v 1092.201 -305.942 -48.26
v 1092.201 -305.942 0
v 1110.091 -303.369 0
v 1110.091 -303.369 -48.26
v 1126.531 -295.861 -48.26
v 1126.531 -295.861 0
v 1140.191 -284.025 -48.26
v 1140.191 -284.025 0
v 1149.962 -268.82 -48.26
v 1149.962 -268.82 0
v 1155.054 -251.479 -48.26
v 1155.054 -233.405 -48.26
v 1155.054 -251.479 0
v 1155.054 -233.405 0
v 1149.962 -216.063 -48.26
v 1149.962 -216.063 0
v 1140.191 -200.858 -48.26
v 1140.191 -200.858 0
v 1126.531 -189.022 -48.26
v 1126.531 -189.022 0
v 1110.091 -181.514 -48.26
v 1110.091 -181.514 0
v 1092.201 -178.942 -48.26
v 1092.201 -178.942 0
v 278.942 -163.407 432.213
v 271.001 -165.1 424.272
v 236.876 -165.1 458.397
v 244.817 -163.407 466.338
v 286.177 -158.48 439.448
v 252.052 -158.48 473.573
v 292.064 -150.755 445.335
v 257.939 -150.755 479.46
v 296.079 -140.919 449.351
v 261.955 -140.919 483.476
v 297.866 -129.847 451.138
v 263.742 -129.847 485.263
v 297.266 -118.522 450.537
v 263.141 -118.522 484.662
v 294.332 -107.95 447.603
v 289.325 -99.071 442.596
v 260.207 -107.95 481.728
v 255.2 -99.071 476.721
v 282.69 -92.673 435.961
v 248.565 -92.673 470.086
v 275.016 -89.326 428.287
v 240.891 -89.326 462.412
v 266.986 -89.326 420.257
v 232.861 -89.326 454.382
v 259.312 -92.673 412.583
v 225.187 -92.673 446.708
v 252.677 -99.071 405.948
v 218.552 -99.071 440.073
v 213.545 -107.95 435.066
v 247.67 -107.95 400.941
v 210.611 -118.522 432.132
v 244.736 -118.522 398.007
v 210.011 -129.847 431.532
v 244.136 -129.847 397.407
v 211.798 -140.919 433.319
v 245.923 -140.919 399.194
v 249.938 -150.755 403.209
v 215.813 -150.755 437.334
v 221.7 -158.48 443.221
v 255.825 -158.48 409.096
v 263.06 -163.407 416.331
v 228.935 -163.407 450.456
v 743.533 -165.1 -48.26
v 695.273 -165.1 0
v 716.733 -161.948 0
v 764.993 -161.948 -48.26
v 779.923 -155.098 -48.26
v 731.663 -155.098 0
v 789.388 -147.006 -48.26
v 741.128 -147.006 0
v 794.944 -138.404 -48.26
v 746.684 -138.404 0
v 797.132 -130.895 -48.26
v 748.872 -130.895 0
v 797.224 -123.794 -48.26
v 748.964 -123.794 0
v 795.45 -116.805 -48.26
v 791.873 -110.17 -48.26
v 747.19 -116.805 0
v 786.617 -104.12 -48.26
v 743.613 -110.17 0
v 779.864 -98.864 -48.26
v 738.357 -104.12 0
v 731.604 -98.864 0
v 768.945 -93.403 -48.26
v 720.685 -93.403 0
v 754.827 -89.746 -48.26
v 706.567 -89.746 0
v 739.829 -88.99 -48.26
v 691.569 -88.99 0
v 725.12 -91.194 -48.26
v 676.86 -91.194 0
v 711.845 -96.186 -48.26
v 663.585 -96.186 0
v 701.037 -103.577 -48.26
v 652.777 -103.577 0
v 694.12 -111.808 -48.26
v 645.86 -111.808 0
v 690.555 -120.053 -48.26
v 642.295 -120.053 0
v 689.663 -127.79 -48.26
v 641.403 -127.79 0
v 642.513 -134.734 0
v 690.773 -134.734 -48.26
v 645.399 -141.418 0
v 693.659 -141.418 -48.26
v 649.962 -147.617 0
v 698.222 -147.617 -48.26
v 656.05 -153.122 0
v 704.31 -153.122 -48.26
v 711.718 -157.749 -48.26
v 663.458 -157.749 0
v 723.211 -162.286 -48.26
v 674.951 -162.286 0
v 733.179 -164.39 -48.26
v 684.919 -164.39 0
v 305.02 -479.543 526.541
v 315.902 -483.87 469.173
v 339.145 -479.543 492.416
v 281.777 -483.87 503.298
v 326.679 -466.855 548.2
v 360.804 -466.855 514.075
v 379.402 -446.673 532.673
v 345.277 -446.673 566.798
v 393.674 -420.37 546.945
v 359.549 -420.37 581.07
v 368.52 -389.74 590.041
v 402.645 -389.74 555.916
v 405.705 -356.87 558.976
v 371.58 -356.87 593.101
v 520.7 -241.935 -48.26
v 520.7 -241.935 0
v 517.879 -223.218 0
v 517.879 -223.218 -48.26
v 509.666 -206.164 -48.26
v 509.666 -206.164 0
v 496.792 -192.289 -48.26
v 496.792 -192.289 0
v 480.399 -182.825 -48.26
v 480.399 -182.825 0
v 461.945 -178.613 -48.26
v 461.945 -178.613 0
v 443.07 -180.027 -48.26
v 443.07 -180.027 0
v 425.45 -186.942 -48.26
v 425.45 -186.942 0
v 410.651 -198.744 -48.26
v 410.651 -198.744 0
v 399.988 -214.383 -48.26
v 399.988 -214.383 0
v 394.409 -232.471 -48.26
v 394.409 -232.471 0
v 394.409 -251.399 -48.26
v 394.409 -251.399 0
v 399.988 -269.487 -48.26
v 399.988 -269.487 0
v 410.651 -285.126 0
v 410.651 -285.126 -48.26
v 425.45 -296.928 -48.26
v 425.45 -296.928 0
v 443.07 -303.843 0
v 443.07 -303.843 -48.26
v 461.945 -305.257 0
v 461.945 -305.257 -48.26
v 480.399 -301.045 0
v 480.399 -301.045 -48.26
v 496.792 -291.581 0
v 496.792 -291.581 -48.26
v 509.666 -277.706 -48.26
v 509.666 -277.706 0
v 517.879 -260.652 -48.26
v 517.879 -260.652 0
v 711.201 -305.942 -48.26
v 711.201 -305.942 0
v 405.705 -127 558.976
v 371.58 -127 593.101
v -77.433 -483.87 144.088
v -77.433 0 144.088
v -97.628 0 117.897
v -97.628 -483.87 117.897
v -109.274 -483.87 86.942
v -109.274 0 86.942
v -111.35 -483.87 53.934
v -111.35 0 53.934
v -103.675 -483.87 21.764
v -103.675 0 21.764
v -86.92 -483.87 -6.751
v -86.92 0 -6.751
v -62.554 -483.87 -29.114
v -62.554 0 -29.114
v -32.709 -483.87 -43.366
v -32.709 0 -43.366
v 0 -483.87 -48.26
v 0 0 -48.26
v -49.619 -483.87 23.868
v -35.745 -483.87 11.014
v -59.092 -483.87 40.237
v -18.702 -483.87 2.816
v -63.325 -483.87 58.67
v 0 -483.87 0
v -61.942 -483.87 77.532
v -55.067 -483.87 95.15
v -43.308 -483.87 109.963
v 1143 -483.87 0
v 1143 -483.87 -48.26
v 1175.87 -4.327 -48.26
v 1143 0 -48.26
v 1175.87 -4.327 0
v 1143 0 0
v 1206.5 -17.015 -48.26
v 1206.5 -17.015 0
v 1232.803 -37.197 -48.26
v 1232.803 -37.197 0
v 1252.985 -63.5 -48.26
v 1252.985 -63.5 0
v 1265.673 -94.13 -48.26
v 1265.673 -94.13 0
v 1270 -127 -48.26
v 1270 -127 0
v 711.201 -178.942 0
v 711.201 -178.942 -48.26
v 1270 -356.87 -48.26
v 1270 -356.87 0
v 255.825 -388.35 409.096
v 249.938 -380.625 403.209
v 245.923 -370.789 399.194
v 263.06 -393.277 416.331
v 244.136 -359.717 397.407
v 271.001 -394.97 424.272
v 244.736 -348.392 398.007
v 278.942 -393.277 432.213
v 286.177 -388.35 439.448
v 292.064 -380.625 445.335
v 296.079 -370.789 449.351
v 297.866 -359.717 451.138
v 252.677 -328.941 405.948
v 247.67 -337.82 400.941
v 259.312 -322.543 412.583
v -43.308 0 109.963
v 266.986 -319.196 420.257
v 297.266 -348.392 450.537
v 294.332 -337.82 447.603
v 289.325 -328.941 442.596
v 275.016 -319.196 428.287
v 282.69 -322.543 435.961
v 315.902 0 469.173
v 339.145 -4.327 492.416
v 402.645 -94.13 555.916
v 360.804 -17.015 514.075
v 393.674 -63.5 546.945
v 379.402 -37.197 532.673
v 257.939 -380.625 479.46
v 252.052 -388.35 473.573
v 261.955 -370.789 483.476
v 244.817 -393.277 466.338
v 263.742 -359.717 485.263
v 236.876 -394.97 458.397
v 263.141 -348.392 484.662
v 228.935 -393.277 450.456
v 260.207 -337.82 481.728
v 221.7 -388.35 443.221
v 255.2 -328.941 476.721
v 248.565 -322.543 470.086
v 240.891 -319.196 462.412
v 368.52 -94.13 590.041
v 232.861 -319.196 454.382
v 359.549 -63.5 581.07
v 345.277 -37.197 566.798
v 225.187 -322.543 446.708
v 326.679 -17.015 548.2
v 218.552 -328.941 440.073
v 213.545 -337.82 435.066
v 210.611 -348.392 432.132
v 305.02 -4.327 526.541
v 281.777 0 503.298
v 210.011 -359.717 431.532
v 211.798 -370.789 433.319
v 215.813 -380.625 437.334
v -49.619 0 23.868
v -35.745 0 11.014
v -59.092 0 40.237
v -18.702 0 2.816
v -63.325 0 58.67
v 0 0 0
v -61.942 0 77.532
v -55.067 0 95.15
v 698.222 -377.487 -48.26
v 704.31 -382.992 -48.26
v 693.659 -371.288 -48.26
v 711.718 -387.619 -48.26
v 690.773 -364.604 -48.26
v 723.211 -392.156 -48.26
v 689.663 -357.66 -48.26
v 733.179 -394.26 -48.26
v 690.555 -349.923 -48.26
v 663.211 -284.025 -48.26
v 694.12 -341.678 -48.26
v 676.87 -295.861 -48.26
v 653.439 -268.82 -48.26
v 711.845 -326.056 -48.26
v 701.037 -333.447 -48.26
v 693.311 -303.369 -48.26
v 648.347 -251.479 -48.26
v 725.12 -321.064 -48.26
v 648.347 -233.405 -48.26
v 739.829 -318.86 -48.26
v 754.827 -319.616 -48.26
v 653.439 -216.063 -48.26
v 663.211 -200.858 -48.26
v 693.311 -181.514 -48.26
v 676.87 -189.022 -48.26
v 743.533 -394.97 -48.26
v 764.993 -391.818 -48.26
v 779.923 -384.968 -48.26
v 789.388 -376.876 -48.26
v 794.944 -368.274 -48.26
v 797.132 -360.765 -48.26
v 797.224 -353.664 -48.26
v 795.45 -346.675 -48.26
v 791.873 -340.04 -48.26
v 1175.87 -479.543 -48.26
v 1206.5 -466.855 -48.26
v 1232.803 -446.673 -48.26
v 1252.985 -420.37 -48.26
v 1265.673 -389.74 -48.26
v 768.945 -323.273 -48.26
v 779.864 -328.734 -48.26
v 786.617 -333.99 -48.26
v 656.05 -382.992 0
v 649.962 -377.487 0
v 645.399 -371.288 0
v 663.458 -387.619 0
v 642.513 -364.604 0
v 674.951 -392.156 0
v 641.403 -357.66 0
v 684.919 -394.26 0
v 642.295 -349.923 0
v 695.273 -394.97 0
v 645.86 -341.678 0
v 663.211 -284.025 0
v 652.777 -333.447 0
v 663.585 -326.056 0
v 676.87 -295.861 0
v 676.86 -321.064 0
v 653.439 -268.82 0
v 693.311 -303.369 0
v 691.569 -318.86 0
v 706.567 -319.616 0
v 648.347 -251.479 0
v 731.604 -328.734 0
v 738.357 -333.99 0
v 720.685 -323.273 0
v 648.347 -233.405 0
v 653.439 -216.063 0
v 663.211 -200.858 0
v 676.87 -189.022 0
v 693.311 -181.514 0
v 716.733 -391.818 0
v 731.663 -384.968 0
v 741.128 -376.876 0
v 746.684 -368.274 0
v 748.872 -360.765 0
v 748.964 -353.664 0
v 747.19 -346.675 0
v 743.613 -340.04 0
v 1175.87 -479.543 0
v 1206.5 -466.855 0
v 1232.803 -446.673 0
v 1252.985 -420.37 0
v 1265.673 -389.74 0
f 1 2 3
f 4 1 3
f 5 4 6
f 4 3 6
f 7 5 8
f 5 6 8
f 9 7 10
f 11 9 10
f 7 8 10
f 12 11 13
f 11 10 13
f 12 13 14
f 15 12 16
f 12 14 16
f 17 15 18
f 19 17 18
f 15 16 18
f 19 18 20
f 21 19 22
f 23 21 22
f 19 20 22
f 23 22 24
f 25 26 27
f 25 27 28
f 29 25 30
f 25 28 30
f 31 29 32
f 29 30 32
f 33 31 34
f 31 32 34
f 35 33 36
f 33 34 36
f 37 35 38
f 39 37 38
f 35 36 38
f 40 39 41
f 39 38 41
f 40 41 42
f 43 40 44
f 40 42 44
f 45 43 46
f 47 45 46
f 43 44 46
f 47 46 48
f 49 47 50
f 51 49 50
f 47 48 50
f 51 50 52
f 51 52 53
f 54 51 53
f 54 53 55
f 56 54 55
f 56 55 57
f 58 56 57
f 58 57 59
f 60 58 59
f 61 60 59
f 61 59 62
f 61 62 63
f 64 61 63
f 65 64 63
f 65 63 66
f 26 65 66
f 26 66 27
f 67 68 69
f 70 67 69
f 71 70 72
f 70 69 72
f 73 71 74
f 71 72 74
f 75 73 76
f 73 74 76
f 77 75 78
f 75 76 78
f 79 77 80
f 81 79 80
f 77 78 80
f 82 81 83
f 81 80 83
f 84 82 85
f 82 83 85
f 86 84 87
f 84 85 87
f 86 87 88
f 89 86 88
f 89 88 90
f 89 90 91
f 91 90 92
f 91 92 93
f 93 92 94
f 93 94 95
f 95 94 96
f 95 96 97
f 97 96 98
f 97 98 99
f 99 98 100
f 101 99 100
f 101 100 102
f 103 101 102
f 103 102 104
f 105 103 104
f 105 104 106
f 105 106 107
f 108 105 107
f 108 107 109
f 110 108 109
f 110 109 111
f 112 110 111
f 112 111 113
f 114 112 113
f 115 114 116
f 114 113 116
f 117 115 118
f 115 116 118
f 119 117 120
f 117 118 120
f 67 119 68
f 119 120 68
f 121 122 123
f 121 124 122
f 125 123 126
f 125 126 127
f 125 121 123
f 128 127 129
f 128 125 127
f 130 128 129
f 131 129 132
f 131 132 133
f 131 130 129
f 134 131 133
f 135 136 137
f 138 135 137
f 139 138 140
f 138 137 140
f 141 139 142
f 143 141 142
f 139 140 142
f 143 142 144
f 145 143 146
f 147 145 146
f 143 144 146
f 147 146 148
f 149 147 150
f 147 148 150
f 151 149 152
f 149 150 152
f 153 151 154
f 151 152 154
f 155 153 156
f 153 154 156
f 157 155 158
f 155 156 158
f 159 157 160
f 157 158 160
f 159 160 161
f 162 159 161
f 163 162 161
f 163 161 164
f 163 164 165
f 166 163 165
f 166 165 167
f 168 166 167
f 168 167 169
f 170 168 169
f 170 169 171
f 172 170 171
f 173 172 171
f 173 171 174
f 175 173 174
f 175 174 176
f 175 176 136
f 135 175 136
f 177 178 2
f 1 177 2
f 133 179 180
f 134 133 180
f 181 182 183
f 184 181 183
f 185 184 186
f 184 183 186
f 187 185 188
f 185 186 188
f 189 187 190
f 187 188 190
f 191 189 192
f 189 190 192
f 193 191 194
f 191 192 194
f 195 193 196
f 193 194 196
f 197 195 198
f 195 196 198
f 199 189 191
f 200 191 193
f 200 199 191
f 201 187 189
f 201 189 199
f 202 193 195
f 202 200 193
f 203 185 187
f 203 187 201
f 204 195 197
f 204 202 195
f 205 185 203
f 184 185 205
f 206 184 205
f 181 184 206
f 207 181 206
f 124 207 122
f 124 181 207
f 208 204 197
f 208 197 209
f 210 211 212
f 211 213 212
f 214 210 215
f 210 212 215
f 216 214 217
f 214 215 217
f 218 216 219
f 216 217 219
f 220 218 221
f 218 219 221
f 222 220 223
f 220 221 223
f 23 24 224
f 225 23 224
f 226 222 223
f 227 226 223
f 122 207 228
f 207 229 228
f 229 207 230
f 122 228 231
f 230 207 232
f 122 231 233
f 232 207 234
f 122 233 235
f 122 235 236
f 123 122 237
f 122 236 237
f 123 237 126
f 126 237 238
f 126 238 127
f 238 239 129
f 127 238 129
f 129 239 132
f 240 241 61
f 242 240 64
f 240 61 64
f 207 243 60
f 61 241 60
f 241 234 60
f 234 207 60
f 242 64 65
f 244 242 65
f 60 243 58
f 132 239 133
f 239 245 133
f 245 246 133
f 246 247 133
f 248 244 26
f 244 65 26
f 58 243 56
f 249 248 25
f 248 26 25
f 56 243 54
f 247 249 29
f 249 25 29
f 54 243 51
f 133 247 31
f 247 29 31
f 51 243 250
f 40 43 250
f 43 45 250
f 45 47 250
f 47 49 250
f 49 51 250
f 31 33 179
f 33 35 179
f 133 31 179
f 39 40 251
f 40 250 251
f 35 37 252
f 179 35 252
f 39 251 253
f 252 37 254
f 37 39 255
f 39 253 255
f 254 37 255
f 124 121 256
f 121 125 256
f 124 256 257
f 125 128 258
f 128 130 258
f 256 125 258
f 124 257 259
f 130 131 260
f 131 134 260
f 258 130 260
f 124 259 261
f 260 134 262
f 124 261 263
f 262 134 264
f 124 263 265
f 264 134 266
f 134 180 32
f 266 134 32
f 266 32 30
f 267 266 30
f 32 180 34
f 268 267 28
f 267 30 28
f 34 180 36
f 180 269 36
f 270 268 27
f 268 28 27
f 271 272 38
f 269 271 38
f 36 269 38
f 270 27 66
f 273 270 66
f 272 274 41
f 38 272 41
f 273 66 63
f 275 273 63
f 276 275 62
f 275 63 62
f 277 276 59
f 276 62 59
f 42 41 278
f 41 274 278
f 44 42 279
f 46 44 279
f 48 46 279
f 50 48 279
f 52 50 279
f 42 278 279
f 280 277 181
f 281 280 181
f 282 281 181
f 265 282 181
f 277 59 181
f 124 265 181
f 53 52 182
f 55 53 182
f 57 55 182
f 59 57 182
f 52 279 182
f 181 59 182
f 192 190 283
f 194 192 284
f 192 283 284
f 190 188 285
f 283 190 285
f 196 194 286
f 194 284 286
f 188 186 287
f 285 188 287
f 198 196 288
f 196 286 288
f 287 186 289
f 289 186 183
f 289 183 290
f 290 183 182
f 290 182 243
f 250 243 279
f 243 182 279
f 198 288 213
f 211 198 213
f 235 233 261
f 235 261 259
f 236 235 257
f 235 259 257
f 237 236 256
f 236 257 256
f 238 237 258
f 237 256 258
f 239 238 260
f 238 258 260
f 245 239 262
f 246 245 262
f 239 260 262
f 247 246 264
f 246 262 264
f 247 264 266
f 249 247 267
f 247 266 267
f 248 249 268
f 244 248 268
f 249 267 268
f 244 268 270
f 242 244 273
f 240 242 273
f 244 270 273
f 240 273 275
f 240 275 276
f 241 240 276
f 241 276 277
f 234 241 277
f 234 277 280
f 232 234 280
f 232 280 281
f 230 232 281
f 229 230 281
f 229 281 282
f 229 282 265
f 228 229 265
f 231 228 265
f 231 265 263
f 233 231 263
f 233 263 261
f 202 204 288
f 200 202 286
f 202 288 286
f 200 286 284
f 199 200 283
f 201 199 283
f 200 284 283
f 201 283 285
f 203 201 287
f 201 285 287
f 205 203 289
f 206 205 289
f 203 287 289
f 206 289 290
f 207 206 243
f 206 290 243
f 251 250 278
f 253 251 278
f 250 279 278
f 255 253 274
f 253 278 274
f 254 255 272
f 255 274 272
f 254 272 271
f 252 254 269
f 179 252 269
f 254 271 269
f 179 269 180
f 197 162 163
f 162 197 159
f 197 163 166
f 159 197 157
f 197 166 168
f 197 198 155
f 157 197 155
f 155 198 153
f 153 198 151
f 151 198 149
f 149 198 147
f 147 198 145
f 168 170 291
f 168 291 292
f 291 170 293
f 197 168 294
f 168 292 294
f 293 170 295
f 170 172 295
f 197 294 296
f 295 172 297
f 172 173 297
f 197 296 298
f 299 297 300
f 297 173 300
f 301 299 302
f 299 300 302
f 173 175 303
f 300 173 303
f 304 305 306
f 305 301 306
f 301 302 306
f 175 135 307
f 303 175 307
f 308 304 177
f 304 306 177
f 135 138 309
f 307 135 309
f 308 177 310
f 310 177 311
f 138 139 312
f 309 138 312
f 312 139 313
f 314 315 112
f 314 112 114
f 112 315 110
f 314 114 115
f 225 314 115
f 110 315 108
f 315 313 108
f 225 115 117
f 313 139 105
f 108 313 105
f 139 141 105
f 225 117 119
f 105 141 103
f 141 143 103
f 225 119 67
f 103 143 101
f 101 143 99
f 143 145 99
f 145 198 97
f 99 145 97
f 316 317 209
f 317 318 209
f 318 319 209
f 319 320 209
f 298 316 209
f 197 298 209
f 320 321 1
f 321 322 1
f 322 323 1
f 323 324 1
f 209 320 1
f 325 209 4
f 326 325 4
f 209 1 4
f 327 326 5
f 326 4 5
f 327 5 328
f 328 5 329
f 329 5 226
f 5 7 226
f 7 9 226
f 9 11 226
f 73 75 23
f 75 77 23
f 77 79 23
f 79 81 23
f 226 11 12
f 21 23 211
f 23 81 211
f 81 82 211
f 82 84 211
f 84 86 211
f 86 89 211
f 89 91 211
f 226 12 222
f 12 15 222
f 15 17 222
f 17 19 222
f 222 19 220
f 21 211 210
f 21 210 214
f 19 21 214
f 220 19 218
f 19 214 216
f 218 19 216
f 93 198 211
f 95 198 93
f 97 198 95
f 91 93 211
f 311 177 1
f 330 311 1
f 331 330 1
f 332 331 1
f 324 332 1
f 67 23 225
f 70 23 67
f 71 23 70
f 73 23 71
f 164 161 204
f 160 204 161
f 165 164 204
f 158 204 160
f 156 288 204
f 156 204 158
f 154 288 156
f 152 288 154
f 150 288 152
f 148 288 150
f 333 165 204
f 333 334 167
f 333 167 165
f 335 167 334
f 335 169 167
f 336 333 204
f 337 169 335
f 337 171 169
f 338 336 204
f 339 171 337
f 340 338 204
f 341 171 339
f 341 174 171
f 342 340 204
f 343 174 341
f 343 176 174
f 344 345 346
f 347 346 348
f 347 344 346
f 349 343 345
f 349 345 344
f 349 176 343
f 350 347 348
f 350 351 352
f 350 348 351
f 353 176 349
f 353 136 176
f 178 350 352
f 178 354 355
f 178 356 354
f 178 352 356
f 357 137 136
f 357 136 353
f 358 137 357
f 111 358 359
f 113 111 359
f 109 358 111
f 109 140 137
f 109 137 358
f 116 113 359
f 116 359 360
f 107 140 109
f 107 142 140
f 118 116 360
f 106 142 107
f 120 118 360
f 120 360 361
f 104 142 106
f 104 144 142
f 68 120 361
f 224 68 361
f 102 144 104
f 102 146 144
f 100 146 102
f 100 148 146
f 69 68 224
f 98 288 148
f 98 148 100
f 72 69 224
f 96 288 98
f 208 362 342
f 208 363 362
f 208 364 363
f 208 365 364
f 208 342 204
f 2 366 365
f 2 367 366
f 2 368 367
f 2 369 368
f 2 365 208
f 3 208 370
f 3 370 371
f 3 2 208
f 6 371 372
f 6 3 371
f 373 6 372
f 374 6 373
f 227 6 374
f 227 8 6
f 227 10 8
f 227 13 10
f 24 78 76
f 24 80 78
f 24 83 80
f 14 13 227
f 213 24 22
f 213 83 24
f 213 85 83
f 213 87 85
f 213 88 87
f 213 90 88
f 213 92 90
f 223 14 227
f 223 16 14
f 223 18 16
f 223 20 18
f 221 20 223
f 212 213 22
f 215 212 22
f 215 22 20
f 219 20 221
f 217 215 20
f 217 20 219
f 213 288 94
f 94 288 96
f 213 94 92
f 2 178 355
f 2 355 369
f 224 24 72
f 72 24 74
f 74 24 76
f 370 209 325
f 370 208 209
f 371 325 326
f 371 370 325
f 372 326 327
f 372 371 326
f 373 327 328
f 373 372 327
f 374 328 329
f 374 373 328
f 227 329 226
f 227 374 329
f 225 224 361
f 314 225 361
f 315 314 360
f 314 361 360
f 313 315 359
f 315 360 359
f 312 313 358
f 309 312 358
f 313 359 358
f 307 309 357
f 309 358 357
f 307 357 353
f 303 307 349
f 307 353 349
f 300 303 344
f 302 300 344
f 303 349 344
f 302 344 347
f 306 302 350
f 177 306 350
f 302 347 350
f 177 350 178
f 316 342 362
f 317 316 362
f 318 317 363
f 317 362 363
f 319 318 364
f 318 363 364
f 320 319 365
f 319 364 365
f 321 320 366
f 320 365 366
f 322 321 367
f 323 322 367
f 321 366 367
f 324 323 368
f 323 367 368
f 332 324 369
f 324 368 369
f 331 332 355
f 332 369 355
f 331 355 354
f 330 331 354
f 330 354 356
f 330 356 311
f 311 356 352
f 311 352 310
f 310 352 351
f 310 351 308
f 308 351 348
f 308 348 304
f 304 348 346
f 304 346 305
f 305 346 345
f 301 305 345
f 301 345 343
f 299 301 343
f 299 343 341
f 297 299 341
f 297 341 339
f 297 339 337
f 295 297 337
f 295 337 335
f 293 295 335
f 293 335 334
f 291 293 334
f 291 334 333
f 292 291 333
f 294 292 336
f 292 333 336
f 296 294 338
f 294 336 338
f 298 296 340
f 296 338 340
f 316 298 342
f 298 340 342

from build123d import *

# Parameters (mm, degrees)
F0_W     = 1270
F0_H     = 48.26
F1_DEPTH = 483.87
F2_R     = 63.5
F3_DEPTH = 48.261
F4_R     = 127
F5_R     = 38.1
F6_DEPTH = 1088.7905941503


with BuildPart() as f1:
    # F0 (on Front) → F1 (new body)
    with BuildSketch(Plane.XZ):
        with Locations((635, -24.13)):
            Rectangle(F0_W, F0_H)
        with BuildLine():
            Line((0, -48.26), (0, 0))
            ThreePointArc((0, 0), (-59.0920227604, 40.2369511729), (-43.3079228428, 109.9631412552))
            Line((-43.3079228428, 109.9631412552), (405.7048832106, 558.9759473086))
            Line((405.7048832106, 558.9759473086), (371.5799099506, 593.1009205687))
            Line((371.5799099506, 593.1009205687), (-77.4328961029, 144.0881145152))
            ThreePointArc((-77.4328961029, 144.0881145152), (-103.6745515501, 21.7641046473), (0, -48.26))
        make_face()
    extrude(amount=F1_DEPTH)

    # F2 (on face) → F3 (cut, through all)
    with BuildSketch(Plane.XY):
        with Locations((457.2, -241.935)):
            Circle(F2_R)
        with BuildLine():
            ThreePointArc((1092.2007215854, -305.9415523028), (1155.7007215854, -242.4415523028), (1092.2007215854, -178.9415523028))
            Line((1092.2007215854, -178.9415523028), (711.2007215854, -178.9415523028))
            ThreePointArc((711.2007215854, -178.9415523028), (647.7007215854, -242.4415523028), (711.2007215854, -305.9415523028))
            Line((711.2007215854, -305.9415523028), (1092.2007215854, -305.9415523028))
        make_face()
    extrude(amount=-F3_DEPTH, mode=Mode.SUBTRACT)

    # F4
    f4_edges = [f1.edges().sort_by_distance(p)[0] for p in [
        (388.642397, 0, 576.038434),
        (388.642397, -483.87, 576.038434),
        (1270, -483.87, -24.13),
        (1270, 0, -24.13),
    ]]
    fillet(f4_edges, radius=F4_R)

    # F5 (on face) → F6 (cut, through all)
    with BuildSketch(Plane(origin=(-110.7605053091, 0, 110.7605053091), x_dir=(0, -1, 0), z_dir=(-0.7071067812, 0, 0.7071067812))):
        with Locations((127, 491.6323569408)):
            Circle(F5_R)
        with Locations((356.87, 491.6323569408)):
            Circle(F5_R)
    extrude(amount=-F6_DEPTH, mode=Mode.SUBTRACT)


solid = f1.part
